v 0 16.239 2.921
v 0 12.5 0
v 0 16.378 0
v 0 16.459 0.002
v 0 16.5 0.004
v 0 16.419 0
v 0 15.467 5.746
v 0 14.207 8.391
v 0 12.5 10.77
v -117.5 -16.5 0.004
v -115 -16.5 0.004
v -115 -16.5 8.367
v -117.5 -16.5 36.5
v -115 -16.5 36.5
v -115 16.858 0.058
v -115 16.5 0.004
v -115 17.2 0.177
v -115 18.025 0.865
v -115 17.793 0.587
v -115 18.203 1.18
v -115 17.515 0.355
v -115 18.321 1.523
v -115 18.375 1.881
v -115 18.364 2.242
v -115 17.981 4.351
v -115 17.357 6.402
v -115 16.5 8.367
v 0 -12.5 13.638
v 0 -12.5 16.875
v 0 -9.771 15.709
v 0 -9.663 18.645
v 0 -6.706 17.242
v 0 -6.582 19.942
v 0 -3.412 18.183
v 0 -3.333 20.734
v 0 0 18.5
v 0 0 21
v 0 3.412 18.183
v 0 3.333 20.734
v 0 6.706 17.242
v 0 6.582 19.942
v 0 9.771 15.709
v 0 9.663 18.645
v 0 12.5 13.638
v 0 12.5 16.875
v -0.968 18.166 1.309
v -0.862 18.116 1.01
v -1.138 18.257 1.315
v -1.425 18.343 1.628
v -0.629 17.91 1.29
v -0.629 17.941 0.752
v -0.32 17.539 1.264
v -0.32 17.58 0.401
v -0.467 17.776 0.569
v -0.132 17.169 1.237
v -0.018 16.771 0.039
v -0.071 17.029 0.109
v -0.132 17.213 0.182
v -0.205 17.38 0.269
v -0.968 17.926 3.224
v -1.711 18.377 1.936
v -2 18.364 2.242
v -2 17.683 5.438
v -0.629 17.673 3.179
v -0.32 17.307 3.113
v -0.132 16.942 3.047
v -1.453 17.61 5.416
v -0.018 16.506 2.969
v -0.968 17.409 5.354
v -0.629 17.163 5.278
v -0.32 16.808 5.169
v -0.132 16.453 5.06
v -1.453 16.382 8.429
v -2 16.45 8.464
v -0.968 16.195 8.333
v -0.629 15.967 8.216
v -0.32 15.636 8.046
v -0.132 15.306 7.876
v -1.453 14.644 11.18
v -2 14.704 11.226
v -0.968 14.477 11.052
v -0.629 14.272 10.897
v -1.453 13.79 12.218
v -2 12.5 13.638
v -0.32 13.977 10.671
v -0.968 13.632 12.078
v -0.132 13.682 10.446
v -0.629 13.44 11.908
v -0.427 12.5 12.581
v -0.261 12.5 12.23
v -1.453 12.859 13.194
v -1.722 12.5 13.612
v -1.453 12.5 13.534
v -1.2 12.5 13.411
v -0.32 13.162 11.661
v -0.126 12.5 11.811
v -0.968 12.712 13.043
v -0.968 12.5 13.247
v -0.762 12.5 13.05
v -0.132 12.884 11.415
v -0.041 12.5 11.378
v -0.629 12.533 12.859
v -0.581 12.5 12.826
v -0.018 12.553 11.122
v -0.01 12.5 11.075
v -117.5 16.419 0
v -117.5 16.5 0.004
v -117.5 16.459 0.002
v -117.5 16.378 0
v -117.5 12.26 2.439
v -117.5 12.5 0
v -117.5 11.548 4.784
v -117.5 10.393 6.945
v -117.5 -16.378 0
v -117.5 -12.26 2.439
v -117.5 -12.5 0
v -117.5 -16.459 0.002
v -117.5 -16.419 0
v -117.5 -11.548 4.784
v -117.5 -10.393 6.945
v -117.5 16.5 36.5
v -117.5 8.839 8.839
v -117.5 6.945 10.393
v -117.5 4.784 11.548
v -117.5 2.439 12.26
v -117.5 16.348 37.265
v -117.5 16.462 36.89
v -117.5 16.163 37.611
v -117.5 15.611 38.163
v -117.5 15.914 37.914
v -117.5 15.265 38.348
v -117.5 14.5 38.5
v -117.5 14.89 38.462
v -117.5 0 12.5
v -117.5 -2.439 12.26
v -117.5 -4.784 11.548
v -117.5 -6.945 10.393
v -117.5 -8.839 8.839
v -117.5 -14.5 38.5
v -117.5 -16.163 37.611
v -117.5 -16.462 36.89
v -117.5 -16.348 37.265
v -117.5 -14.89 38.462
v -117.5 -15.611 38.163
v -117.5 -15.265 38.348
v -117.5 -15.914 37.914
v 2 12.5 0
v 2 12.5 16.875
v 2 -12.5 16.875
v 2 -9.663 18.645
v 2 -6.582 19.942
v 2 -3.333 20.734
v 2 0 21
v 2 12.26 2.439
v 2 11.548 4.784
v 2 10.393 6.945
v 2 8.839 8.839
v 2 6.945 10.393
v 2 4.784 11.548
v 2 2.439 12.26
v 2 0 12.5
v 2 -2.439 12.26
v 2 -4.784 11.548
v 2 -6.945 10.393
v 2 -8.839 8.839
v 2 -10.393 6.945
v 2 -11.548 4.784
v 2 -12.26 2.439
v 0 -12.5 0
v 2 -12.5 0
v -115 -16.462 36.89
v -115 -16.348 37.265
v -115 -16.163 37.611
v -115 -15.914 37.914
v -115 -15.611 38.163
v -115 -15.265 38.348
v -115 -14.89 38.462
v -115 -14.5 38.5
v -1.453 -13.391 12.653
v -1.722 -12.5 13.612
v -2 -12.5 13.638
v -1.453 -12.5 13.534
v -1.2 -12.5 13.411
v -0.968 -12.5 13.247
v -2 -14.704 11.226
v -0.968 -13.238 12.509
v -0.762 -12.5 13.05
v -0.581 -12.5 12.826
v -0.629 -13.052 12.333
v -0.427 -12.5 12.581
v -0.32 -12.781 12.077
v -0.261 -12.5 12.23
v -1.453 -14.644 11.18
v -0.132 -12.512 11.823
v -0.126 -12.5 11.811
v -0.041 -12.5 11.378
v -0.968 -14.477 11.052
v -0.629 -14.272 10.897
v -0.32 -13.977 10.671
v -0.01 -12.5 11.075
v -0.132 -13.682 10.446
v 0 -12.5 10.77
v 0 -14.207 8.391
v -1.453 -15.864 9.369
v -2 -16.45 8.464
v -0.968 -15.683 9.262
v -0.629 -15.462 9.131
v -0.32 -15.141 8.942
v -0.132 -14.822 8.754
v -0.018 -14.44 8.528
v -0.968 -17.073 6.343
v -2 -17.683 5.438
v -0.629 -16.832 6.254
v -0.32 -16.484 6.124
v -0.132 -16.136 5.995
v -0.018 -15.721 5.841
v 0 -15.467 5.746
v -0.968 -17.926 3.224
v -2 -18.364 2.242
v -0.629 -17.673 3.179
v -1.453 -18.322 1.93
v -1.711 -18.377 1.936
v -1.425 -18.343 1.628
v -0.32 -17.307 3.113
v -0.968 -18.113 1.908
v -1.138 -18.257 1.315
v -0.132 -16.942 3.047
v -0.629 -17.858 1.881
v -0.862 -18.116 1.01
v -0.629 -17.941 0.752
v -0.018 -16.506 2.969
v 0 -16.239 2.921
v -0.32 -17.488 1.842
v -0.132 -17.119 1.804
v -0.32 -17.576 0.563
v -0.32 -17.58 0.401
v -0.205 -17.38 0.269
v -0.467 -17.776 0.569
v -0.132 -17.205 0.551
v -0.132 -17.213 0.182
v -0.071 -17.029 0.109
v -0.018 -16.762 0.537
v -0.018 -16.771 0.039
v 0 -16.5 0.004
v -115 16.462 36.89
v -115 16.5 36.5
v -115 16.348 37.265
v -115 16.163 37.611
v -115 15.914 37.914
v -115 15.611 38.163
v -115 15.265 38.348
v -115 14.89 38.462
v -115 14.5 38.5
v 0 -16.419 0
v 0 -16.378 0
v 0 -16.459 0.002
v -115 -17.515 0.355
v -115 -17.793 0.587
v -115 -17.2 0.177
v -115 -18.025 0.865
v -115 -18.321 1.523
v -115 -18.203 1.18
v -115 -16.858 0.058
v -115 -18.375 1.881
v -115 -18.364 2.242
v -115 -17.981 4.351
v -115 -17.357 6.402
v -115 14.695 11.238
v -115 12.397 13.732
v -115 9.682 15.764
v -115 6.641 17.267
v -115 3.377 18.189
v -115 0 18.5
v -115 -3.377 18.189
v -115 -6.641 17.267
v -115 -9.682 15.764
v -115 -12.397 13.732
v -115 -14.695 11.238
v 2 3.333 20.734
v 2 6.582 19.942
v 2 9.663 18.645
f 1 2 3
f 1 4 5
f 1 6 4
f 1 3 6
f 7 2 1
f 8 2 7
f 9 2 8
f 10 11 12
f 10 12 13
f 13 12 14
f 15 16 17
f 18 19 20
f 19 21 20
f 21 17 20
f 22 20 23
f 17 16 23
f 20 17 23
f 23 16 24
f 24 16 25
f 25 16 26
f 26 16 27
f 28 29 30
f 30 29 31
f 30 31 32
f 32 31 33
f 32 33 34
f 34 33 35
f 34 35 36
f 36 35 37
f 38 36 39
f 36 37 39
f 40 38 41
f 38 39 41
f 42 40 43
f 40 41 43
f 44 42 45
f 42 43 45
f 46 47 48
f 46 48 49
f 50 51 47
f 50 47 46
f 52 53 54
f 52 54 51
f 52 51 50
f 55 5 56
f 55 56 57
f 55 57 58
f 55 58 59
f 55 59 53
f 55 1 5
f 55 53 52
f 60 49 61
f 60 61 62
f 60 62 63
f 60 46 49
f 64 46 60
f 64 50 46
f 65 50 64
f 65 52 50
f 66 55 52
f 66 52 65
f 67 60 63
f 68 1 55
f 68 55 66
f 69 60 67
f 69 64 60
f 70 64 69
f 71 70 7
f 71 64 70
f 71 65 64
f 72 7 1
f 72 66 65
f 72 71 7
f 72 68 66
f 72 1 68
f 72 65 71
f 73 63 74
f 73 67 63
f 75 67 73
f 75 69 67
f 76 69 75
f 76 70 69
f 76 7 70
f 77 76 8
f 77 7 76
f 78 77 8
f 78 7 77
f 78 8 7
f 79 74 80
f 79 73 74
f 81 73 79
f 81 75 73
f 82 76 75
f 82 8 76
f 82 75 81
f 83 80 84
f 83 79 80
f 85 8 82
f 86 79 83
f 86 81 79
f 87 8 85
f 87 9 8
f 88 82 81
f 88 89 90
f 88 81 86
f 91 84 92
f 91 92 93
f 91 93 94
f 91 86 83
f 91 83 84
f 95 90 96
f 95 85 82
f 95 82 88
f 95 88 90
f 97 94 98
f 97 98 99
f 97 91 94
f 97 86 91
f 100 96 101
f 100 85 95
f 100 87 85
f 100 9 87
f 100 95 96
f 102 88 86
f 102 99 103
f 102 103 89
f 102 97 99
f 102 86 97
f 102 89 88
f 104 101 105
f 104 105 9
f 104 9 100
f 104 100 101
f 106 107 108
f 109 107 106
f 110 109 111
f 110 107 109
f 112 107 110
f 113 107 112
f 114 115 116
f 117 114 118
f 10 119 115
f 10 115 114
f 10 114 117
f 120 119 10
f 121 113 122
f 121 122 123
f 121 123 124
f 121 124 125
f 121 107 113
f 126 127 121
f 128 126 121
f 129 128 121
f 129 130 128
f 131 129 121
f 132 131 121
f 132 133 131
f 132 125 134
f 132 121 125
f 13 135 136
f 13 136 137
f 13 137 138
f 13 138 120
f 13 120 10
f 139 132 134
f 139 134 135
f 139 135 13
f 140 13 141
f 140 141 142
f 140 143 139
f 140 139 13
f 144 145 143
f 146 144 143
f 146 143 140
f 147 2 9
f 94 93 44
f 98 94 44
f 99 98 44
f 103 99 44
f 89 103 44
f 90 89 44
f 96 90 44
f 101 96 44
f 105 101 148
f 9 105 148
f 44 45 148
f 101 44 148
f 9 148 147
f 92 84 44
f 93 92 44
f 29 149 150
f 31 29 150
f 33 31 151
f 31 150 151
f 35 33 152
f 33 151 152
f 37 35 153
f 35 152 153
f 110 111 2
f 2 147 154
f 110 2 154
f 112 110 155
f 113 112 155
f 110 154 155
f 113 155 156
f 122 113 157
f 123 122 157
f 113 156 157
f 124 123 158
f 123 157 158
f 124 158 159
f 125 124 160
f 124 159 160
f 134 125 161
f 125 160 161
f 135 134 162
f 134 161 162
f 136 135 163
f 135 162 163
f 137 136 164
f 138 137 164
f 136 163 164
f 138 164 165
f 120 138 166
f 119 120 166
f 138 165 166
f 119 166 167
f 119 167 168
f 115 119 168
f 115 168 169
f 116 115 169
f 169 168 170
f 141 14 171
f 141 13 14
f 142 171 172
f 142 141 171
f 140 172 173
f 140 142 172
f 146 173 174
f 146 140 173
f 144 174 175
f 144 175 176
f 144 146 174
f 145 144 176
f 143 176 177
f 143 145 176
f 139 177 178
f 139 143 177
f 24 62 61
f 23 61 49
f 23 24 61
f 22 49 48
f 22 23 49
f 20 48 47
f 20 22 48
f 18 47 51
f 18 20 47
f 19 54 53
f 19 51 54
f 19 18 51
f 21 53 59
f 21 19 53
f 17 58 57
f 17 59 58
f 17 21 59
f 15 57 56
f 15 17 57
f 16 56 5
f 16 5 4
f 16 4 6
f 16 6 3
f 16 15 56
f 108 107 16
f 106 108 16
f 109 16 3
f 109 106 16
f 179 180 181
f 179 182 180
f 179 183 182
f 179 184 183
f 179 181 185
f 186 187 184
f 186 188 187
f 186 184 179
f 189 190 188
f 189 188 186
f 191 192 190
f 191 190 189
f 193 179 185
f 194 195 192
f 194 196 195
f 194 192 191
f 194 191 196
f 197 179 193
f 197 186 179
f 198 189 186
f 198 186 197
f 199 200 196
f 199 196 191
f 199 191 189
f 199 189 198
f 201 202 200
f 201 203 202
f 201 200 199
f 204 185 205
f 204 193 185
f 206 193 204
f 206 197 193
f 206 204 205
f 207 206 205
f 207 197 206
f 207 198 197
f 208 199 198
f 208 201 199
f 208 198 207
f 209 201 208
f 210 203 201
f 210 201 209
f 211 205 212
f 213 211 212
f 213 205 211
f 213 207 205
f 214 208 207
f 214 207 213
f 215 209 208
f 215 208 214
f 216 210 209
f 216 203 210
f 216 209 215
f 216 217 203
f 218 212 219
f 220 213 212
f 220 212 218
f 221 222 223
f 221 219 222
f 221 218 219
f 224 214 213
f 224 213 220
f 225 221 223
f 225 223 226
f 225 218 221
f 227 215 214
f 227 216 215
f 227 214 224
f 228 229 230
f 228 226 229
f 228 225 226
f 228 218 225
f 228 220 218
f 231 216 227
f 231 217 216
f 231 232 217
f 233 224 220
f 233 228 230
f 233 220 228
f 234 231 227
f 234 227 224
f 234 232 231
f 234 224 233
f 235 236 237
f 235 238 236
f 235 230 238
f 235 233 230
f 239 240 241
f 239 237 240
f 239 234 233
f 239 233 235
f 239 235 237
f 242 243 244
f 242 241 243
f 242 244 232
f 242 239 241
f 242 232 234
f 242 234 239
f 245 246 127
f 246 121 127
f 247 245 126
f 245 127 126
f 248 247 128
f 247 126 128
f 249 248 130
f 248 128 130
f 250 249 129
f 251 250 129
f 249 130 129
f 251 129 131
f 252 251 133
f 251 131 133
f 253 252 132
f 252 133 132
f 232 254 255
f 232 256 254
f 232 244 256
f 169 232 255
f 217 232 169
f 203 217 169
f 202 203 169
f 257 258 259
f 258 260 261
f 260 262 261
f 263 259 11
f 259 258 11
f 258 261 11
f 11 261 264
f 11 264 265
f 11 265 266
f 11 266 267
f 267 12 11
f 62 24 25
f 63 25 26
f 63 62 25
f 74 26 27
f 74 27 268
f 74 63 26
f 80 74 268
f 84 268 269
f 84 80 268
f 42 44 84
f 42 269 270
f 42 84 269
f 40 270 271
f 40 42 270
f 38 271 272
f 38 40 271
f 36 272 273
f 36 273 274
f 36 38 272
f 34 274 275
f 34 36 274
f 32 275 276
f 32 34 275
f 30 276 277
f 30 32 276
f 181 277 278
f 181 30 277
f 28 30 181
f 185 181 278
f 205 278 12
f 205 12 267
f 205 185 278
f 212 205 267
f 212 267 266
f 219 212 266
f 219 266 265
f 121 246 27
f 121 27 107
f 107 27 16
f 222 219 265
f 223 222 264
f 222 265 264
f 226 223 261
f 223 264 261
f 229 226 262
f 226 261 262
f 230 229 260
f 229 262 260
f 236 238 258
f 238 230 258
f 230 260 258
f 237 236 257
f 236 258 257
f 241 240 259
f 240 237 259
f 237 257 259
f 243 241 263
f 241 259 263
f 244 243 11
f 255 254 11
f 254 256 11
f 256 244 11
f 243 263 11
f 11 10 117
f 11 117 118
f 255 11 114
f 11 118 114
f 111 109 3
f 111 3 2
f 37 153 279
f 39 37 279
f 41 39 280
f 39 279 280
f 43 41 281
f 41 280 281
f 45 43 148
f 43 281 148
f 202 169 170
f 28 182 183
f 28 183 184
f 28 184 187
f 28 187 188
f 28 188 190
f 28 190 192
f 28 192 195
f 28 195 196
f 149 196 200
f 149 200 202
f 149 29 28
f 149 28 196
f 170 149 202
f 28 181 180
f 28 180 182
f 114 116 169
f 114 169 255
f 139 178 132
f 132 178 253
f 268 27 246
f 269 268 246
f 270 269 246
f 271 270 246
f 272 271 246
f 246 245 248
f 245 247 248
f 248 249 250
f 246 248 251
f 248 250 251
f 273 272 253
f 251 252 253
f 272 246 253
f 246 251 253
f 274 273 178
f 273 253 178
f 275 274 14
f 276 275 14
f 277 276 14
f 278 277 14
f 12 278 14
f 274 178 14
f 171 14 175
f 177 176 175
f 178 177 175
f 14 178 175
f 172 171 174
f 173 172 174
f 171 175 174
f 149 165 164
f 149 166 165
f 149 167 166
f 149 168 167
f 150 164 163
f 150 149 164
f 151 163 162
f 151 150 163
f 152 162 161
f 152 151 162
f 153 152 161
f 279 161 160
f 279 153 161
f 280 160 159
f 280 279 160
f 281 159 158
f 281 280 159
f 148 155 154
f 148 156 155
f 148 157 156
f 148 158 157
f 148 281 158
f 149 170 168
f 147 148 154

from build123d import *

# Parameters (mm, degrees)
F1_DEPTH     = 115
F3_DEPTH     = 2
F5_DEPTH     = 2.5
F6_R         = 2
F8_DEPTH     = 5
F10_DEPTH    = 119.5
F11_T1_DEPTH = 126.2328463215
F11_T6_ANGLE = 78.4675131369
F12_T1_DEPTH = 124.2328463215
F12_T6_ANGLE = 71.5045093033


# Not quite as in the source:
# - a fillet or chamfer that OpenCascade refuses, or shapes differently, is made with other operations: its cross-section is extruded or revolved along the edge and cut away or added


with BuildPart() as f1:
    # F0 (on Right) → F1 (new body)
    with BuildSketch(Plane.YZ):
        with BuildLine():
            Line((-18.5, 0), (18.5, 0))
            ThreePointArc((18.5, 0), (0, 18.5), (-18.5, 0))
        make_face()
    extrude(amount=-F1_DEPTH)

    # F2 (on face) → F3 (join)
    with BuildSketch(Plane.YZ):
        with BuildLine():
            Line((12.5, 21), (-12.5, 21))
            Line((-12.5, 21), (-12.5, 13.638181697))
            ThreePointArc((-12.5, 13.638181697), (0, 18.5), (12.5, 13.638181697))
            Line((12.5, 13.638181697), (12.5, 21))
        make_face()
        with BuildLine():
            ThreePointArc((12.5, 13.638181697), (0, 18.5), (-12.5, 13.638181697))
            Line((-12.5, 13.638181697), (-12.5, 0))
            Line((-12.5, 0), (12.5, 0))
            Line((12.5, 0), (12.5, 13.638181697))
        make_face()
    extrude(amount=F3_DEPTH)

    # F4 (on face) → F5 (join)
    with BuildSketch(Plane(origin=(-115, 0, 0), x_dir=(0, -1, 0), z_dir=(-1, 0, 0))):
        with BuildLine():
            Line((-16.5, 8.3666002653), (-16.5, 0))
            Line((-16.5, 0), (16.5, 0))
            Line((16.5, 0), (16.5, 8.3666002653))
            ThreePointArc((16.5, 8.3666002653), (0, 18.5), (-16.5, 8.3666002653))
        make_face()
        with BuildLine():
            Line((-16.5, 38.5), (-16.5, 8.3666002653))
            ThreePointArc((-16.5, 8.3666002653), (0, 18.5), (16.5, 8.3666002653))
            Line((16.5, 8.3666002653), (16.5, 38.5))
            Line((16.5, 38.5), (-16.5, 38.5))
        make_face()
    extrude(amount=F5_DEPTH)

    # F6
    f6_edges = [f1.edges().sort_by_distance(p)[0] for p in [
        (-116.25, 16.5, 38.5),
        (-116.25, -16.5, 38.5),
    ]]
    fillet(f6_edges, radius=F6_R)

    # F7 (on face) → F8 (cut)
    with BuildSketch(Plane.YZ.offset(2)):
        with BuildLine():
            Line((-12.5, 21), (-12.5, 16.8745370307))
            ThreePointArc((-12.5, 16.8745370307), (-6.5815925928, 19.9419818208), (1.93e-08, 21))
            Line((1.93e-08, 21), (-12.5, 21))
        make_face()
        with BuildLine():
            ThreePointArc((1.93e-08, 21), (6.5815926111, 19.9419818148), (12.5, 16.8745370307))
            Line((12.5, 16.8745370307), (12.5, 21))
            Line((12.5, 21), (1.93e-08, 21))
        make_face()
    extrude(amount=-F8_DEPTH, mode=Mode.SUBTRACT)

    # F9 (on face) → F10 (cut, through all)
    with BuildSketch(Plane.YZ.offset(2)):
        with BuildLine():
            Line((-12.5, 0), (12.5, 0))
            ThreePointArc((12.5, 0), (0, 12.5), (-12.5, 0))
        make_face()
    extrude(amount=-F10_DEPTH, mode=Mode.SUBTRACT)

    # F11: fillet of radius 2 on 2 edges, made by hand

    # F11_s2 → F11_t1 (cut)
    with BuildSketch(Plane.YZ.offset(-120.6164231607)):
        with BuildLine():
            ThreePointArc((18.3635926092, 2.2424242424), (17.8758119724, 0.6742640694), (16.3783393542, 0))
            Line((16.3783393542, 0), (18.5, 0))
            ThreePointArc((18.5, 0), (18.4658666635, 1.1232846321), (18.3635926092, 2.2424242424))
        make_face()
    extrude(amount=F11_T1_DEPTH, mode=Mode.SUBTRACT)


with BuildPart() as f11_tool4:
    # F11_s5 → F11_t6 (revolve)
    with BuildSketch(Plane(origin=(0, 0, 0), x_dir=(1, 0, 0), z_dir=(0, 0.8908514497, 0.454294722))):
        with BuildLine():
            ThreePointArc((-2, -18.5), (-0.5857864376, -17.9142135624), (0, -16.5))
            Line((0, -16.5), (0, -18.5))
            Line((0, -18.5), (-2, -18.5))
        make_face()
    revolve(axis=Axis((0, 0, 0), (1, 0, 0)), revolution_arc=F11_T6_ANGLE)

    split(bisect_by=Plane.XZ.offset(12.5), keep=Keep.TOP)


with BuildPart() as f1_1:
    add(f1.part)

    # F11_t3: cut F11_tool4
    add(f11_tool4.part, mode=Mode.SUBTRACT)

    # F12: fillet of radius 2 on 2 edges, made by hand

    # F12_s2 → F12_t1 (cut)
    with BuildSketch(Plane.YZ.offset(-120.6164231607)):
        with BuildLine():
            ThreePointArc((-18.3635926092, 2.2424242424), (-17.8758119724, 0.6742640694), (-16.3783393542, 0))
            Line((-16.3783393542, 0), (-18.5, 0))
            ThreePointArc((-18.5, 0), (-18.4658666635, 1.1232846321), (-18.3635926092, 2.2424242424))
        make_face()
    extrude(amount=F12_T1_DEPTH, mode=Mode.SUBTRACT)


with BuildPart() as f12_tool4:
    # F12_s5 → F12_t6 (revolve)
    with BuildSketch(Plane(origin=(0, 0, 0), x_dir=(1, 0, 0), z_dir=(0, -0.1482330737, -0.9889524538))):
        with BuildLine():
            ThreePointArc((-2, -18.5), (-0.5857864376, -17.9142135624), (0, -16.5))
            Line((0, -16.5), (0, -18.5))
            Line((0, -18.5), (-2, -18.5))
        make_face()
    revolve(axis=Axis((0, 0, 0), (1, 0, 0)), revolution_arc=F12_T6_ANGLE)

    split(bisect_by=Plane.XZ.offset(-12.5), keep=Keep.BOTTOM)


with BuildPart() as f1_2:
    add(f1_1.part)

    # F12_t3: cut F12_tool4
    add(f12_tool4.part, mode=Mode.SUBTRACT)


solid = f1_2.part
